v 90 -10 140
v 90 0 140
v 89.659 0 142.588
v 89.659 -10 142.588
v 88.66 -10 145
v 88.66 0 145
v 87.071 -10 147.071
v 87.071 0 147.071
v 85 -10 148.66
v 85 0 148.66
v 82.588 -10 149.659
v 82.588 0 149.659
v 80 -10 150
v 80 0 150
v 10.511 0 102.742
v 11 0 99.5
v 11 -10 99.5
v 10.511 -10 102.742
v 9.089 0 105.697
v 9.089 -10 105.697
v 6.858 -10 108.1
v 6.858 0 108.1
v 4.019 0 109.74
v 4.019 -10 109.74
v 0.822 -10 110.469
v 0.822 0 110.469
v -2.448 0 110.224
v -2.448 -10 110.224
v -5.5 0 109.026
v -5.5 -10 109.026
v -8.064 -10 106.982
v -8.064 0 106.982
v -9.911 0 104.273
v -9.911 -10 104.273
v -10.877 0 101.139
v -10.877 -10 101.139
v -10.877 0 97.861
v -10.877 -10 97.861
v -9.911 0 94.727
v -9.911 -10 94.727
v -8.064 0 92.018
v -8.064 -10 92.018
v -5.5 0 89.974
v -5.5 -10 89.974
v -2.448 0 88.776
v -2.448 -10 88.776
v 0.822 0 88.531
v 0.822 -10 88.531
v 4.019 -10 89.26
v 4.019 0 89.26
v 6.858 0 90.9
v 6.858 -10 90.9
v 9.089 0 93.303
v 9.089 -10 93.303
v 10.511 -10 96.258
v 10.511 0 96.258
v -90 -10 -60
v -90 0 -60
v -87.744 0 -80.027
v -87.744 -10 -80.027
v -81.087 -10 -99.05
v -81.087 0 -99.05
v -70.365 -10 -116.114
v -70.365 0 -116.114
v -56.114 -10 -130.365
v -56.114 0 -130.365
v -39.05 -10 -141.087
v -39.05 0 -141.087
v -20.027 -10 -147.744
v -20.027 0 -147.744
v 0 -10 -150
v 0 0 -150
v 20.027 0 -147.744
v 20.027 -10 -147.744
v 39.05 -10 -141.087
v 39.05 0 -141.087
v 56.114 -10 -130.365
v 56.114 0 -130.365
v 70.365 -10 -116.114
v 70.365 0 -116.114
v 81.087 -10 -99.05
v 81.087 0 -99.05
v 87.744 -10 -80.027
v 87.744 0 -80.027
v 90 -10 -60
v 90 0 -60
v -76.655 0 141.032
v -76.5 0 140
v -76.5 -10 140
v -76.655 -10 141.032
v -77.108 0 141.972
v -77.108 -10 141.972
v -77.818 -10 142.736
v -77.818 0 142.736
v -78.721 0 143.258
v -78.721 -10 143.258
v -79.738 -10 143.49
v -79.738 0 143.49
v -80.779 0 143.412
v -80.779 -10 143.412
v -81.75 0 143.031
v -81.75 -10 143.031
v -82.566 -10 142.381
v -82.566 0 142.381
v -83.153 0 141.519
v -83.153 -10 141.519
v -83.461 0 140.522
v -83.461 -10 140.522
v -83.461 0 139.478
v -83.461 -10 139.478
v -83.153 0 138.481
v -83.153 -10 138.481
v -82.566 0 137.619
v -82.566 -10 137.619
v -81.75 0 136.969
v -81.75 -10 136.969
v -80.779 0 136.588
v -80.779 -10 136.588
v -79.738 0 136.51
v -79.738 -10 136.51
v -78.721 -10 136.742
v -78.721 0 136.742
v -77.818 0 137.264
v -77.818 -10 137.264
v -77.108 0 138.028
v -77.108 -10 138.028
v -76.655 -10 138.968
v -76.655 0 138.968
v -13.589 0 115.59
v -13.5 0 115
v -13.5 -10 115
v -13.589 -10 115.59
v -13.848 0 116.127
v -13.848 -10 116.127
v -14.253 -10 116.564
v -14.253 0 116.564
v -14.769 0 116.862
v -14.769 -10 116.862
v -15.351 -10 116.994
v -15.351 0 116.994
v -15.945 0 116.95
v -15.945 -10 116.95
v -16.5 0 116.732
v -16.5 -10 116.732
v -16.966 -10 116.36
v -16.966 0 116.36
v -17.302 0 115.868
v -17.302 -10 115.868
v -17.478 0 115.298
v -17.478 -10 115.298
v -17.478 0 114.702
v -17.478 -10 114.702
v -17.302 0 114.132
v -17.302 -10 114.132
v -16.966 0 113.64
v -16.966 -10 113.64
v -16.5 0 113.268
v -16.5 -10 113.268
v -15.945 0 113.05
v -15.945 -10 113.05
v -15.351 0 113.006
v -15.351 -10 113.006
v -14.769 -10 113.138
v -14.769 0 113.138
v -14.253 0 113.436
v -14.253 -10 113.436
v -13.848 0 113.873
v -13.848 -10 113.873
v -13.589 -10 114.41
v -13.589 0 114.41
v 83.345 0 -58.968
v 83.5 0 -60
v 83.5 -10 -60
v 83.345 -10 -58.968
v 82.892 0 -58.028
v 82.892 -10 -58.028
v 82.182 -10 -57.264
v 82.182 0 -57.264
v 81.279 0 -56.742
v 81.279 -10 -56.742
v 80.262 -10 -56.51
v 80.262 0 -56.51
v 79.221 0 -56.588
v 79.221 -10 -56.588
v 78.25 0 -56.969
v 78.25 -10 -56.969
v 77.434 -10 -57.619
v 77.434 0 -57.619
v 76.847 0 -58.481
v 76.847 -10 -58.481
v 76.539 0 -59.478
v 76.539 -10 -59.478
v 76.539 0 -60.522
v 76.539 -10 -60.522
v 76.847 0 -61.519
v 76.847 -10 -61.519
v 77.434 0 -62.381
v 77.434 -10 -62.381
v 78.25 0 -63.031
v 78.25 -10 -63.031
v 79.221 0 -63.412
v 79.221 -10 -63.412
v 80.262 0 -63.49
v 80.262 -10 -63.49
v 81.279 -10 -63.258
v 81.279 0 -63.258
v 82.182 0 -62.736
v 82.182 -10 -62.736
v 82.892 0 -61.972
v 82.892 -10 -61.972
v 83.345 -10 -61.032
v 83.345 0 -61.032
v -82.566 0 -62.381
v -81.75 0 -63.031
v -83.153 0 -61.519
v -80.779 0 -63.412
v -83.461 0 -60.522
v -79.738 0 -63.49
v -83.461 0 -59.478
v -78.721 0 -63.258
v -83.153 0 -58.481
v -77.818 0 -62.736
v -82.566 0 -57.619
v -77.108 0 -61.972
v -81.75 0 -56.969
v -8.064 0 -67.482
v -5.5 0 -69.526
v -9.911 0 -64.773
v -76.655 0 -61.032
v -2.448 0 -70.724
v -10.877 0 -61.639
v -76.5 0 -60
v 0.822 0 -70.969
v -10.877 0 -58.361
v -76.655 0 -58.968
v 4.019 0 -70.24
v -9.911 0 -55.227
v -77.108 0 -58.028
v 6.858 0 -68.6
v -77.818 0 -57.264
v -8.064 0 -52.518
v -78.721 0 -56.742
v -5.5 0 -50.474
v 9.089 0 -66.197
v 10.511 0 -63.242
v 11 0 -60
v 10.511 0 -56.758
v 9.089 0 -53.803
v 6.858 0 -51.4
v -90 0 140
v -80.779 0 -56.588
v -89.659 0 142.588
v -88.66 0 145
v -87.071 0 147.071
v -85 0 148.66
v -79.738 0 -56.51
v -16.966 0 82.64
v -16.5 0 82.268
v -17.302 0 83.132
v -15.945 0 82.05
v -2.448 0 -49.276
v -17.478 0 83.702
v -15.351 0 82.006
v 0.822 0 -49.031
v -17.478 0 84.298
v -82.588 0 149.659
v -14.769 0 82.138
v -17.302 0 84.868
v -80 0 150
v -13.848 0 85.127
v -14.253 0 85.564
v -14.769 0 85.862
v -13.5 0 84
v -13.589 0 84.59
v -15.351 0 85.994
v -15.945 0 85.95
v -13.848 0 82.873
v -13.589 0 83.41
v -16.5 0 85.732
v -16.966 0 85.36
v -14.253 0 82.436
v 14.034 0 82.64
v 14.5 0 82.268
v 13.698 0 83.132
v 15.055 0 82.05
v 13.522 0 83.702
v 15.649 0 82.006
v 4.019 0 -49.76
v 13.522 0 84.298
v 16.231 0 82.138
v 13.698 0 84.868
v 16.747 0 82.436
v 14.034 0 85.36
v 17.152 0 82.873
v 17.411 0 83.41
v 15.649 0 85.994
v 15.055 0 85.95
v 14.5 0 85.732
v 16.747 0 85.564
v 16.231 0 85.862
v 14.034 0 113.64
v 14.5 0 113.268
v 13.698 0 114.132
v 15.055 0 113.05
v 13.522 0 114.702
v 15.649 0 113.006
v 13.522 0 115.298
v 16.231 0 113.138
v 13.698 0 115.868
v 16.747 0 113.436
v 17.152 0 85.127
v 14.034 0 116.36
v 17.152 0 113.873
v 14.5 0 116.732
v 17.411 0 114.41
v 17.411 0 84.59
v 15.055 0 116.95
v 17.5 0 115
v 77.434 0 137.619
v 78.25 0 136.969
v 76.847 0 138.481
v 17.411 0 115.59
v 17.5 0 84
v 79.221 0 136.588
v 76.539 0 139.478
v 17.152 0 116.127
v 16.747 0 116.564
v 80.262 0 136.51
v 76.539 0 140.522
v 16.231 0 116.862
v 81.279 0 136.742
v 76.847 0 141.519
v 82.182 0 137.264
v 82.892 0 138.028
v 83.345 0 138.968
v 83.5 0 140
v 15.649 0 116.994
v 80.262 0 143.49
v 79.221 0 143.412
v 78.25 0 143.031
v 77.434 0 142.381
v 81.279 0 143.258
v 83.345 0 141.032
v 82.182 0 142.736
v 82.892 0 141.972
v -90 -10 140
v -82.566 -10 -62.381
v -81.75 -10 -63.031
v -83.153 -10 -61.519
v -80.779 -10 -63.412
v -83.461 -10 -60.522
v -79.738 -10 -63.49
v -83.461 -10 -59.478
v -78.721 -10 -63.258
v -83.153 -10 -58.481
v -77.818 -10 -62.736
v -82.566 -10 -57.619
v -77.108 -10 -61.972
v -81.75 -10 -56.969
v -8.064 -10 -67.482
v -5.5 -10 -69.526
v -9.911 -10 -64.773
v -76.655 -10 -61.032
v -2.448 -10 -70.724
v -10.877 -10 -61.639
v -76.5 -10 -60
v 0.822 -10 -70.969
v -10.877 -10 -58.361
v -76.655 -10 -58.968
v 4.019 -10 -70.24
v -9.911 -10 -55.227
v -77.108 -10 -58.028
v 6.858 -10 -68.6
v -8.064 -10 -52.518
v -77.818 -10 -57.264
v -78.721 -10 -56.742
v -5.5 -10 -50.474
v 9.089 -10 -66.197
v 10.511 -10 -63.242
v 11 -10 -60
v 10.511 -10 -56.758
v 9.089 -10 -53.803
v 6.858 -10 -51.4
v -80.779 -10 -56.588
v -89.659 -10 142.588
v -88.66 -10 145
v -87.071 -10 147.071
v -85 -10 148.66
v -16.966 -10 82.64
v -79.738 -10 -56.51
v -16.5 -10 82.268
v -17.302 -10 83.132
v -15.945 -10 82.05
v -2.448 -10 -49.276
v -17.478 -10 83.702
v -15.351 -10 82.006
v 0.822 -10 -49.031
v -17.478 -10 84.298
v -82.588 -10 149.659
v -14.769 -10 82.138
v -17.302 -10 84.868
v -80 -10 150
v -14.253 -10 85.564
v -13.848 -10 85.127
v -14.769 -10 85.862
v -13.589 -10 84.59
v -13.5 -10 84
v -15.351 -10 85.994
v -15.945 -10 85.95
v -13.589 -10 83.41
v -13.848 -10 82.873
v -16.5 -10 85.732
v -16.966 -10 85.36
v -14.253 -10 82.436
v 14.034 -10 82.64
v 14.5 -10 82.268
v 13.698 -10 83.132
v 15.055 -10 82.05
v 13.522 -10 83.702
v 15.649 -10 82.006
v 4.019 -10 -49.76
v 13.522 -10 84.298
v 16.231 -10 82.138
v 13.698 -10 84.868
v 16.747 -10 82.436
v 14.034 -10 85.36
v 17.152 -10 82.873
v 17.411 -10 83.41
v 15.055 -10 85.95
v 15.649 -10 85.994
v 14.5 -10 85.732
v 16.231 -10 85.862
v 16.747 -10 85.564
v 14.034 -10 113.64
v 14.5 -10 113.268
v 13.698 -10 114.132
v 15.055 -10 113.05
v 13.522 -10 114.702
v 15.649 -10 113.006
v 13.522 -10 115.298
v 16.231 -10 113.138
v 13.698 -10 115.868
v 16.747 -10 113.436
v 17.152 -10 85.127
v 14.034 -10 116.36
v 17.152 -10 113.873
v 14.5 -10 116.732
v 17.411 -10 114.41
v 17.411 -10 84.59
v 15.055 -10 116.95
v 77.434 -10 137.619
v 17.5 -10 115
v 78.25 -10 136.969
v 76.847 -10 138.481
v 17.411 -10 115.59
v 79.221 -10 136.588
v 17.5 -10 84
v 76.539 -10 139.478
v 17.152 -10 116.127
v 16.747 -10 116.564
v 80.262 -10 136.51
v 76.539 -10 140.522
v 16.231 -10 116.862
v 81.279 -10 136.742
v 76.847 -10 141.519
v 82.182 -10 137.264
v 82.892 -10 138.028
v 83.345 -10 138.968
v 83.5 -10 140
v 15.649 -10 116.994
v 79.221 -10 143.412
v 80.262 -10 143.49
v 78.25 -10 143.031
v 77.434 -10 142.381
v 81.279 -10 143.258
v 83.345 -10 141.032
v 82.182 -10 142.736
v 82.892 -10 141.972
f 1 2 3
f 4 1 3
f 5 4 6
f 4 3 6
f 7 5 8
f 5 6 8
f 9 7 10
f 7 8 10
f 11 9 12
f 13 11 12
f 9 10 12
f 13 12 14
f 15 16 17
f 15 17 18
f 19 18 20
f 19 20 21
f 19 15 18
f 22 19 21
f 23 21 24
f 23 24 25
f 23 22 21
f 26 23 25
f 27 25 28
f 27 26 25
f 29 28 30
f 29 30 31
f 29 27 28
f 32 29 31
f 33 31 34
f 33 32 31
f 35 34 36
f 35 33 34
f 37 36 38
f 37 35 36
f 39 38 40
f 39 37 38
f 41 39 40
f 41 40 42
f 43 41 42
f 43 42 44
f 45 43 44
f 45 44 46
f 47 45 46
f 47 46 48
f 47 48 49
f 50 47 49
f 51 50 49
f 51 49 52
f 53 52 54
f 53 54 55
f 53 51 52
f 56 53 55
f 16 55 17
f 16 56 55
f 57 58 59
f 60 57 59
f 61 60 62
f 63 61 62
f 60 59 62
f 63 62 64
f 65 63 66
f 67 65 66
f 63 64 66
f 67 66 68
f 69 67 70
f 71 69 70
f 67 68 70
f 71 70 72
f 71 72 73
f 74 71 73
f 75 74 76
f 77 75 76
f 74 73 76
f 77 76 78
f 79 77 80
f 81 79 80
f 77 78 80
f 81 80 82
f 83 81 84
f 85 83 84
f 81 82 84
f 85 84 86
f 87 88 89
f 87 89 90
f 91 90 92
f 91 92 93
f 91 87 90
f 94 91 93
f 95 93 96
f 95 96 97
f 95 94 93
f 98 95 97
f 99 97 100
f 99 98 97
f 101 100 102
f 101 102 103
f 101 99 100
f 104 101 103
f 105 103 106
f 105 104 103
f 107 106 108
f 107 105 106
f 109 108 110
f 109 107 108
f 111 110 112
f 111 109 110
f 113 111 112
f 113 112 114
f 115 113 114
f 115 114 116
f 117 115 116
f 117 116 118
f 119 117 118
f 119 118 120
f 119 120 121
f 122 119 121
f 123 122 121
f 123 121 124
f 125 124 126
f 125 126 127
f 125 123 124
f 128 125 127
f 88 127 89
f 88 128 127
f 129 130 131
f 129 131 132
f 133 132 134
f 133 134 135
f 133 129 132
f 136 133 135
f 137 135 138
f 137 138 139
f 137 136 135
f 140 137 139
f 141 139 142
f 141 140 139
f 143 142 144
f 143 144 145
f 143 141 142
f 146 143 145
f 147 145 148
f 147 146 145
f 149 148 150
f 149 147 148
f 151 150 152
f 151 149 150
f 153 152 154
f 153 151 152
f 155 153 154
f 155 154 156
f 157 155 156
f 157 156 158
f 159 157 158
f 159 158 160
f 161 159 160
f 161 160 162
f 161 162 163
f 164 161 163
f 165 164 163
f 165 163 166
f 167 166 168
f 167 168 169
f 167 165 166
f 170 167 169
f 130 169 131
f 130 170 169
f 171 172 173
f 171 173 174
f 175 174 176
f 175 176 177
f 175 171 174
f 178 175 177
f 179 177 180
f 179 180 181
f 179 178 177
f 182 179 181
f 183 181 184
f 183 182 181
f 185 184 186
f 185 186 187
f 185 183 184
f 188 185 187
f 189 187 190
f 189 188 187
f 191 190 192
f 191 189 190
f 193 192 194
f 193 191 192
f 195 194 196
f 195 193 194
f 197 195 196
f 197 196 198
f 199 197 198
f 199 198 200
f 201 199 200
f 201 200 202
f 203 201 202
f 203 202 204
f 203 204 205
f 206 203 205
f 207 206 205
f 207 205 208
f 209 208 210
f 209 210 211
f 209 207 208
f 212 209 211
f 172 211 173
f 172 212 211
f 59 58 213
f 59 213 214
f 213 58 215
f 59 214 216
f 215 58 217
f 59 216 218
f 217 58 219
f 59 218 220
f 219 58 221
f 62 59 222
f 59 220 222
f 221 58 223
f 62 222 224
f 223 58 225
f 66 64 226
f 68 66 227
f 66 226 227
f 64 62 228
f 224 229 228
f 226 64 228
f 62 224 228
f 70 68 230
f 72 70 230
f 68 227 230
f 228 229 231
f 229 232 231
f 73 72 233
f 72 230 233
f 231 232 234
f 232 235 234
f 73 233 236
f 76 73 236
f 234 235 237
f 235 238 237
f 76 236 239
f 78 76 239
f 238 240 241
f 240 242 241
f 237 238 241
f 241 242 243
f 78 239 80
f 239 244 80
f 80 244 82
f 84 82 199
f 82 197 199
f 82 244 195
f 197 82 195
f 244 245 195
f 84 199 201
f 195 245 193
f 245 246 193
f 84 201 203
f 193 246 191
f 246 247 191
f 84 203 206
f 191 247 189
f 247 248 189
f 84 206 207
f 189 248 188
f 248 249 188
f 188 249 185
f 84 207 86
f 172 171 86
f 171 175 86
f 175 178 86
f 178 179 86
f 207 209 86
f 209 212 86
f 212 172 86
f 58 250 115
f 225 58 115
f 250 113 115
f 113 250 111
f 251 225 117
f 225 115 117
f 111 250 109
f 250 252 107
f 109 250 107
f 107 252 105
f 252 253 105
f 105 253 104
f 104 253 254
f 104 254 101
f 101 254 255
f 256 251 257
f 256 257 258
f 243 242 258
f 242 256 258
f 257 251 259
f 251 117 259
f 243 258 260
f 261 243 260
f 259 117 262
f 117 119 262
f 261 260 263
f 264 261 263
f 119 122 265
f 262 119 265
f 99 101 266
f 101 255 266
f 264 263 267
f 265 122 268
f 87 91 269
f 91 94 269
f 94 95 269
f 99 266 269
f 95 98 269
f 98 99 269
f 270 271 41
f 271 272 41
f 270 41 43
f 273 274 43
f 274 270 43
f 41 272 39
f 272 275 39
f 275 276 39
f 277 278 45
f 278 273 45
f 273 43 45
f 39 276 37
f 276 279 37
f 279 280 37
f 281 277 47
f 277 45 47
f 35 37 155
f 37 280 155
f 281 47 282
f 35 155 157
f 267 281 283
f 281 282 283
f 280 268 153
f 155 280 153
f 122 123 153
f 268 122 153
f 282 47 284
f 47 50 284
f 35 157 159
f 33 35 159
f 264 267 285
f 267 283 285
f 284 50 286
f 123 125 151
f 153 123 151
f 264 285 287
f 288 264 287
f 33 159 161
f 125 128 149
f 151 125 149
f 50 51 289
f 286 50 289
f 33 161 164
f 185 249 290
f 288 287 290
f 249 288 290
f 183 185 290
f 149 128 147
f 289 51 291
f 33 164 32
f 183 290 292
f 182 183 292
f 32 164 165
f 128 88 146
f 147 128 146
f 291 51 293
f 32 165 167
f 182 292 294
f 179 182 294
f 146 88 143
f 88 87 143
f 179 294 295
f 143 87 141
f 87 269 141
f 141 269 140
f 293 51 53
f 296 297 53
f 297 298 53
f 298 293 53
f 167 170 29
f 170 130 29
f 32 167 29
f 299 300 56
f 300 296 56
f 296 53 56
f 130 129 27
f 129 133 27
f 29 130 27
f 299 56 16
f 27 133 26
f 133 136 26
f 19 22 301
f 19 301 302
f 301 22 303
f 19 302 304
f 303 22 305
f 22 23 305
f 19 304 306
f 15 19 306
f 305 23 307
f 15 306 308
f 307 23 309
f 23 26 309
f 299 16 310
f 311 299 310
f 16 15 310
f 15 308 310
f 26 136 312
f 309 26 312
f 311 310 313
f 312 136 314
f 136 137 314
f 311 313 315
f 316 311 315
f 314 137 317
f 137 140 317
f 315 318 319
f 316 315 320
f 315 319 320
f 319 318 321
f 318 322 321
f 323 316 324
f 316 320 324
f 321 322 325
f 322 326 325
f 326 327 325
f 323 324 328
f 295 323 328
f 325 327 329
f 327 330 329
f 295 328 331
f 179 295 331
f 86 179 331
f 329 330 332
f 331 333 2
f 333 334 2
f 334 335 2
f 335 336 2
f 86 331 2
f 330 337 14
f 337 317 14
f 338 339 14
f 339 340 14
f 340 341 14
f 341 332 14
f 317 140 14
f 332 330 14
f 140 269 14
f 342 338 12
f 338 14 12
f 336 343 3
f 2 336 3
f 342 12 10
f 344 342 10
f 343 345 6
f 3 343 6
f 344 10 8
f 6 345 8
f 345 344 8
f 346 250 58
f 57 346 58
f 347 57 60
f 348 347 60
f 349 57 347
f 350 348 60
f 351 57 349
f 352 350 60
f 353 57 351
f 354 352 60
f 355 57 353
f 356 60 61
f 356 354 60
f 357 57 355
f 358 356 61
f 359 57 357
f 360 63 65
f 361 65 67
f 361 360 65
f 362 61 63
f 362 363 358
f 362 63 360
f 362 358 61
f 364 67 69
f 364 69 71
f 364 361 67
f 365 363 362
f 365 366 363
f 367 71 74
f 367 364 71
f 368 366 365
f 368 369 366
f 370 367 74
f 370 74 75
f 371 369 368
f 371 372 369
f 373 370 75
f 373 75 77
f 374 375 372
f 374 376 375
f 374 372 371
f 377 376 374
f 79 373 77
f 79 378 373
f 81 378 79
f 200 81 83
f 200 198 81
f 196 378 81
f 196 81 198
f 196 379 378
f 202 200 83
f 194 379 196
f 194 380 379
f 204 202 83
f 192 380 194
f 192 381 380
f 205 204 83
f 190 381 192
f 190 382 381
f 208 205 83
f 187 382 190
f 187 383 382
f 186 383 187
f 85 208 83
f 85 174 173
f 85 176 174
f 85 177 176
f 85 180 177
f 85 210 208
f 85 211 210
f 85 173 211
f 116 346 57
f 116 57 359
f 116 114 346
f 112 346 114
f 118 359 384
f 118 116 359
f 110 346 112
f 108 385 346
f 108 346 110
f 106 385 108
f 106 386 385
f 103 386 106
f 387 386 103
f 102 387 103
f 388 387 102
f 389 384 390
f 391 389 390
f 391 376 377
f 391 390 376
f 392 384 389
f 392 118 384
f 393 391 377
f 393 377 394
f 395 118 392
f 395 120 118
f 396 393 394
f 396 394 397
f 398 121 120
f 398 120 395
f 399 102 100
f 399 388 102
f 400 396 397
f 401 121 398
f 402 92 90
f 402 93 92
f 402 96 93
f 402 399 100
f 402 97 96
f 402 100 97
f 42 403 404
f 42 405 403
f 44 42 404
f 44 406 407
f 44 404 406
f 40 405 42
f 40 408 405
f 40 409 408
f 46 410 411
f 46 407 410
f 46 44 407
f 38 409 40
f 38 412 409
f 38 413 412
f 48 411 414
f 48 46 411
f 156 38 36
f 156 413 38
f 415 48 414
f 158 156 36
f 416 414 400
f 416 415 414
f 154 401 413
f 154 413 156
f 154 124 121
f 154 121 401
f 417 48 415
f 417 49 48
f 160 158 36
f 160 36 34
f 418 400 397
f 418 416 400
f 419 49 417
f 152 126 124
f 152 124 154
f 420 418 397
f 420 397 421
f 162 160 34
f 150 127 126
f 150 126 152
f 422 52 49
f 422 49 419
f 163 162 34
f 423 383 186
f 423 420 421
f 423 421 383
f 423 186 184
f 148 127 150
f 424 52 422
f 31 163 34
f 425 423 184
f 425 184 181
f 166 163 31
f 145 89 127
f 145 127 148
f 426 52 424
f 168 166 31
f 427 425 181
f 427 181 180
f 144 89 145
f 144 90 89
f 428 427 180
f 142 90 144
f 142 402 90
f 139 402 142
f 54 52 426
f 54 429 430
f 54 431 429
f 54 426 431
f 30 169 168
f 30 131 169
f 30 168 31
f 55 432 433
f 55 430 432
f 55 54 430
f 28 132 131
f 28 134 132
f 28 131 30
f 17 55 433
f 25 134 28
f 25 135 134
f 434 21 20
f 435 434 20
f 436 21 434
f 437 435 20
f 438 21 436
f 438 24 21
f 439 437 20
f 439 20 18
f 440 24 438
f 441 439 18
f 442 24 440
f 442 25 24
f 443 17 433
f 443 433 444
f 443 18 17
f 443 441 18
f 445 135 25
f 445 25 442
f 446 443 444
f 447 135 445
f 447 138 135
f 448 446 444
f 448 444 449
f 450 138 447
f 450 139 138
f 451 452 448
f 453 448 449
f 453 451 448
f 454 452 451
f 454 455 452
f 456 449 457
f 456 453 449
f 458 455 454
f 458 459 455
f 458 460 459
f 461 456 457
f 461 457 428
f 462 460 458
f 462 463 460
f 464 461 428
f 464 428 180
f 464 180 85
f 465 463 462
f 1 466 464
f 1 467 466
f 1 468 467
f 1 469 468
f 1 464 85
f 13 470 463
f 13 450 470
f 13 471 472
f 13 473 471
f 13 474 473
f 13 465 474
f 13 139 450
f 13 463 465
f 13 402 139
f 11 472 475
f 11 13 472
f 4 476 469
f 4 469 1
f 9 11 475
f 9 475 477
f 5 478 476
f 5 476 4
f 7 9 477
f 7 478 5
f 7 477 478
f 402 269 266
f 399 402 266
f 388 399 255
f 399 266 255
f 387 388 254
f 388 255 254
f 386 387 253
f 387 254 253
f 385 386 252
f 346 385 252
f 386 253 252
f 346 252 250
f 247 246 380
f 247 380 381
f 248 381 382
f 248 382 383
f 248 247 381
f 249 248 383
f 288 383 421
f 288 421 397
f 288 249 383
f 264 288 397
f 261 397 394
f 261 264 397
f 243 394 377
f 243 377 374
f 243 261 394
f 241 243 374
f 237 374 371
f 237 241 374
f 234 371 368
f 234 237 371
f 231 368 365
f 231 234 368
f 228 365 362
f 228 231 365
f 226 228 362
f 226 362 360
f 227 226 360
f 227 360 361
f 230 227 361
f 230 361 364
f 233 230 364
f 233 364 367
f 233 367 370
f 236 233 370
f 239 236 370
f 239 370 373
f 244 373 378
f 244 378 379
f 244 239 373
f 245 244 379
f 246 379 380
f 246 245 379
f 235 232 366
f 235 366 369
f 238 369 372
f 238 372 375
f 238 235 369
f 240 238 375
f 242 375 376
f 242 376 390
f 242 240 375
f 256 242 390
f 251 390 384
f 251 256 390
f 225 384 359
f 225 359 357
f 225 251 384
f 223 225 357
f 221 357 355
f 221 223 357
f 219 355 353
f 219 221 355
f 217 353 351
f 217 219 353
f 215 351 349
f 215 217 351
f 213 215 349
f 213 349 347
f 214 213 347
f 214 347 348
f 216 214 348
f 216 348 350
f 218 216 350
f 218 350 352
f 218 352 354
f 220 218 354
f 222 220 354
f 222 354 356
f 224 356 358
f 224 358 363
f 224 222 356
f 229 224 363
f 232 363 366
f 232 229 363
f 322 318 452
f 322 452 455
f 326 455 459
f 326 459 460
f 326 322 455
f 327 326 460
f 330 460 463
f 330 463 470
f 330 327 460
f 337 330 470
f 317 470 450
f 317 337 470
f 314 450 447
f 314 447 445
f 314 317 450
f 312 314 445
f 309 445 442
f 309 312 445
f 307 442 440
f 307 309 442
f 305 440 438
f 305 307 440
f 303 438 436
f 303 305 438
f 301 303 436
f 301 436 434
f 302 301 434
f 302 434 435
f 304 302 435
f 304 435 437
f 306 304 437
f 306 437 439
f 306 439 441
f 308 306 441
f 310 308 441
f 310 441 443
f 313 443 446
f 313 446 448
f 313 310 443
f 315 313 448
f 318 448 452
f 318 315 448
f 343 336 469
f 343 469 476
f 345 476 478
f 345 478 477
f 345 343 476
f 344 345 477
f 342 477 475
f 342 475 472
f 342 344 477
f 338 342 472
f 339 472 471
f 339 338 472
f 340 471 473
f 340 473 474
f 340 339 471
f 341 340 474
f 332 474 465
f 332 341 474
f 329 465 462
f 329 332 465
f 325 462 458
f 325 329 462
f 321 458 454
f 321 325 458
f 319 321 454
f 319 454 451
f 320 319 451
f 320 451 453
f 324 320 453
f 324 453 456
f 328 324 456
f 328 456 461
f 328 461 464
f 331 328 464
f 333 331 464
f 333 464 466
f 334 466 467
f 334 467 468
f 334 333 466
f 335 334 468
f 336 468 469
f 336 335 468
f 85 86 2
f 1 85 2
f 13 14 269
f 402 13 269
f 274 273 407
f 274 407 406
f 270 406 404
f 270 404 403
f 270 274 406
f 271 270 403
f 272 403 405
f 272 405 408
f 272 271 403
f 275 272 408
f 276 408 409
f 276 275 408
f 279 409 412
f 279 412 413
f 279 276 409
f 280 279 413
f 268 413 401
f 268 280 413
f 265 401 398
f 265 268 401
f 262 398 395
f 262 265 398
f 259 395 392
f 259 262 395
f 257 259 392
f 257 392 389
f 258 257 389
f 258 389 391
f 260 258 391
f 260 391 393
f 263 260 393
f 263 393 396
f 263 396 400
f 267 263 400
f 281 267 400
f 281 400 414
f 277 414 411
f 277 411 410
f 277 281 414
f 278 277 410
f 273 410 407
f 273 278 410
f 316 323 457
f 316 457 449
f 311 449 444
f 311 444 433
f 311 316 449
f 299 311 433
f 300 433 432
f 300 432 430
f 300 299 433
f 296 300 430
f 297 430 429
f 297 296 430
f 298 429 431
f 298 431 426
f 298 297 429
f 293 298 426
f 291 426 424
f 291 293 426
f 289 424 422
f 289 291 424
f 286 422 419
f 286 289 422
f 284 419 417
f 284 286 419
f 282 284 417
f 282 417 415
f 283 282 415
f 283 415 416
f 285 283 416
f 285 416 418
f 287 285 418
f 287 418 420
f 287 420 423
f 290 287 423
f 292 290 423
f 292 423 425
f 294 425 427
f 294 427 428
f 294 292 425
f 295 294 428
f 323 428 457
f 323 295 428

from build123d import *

# Parameters (mm, degrees)
F0_R     = 3.5
F0_R_2   = 11
F0_R_3   = 2
F1_DEPTH = 10


with BuildPart() as f1:
    # F0 (on Front) → F1 (new body)
    with BuildSketch(Plane.XZ):
        with BuildLine():
            ThreePointArc((90, 140), (87.071068, 147.071068), (80, 150))
            Line((80, 150), (-80, 150))
            ThreePointArc((-80, 150), (-87.071068, 147.071068), (-90, 140))
            Line((-90, 140), (-90, -60))
            ThreePointArc((-90, -60), (-63.63961, -123.63961), (0, -150))
            ThreePointArc((0, -150), (63.63961, -123.63961), (90, -60))
            Line((90, -60), (90, 140))
        make_face()
        with Locations((-80, -60)):
            Circle(F0_R, mode=Mode.SUBTRACT)
        with Locations((0, -60)):
            Circle(F0_R_2, mode=Mode.SUBTRACT)
        with Locations((80, -60)):
            Circle(F0_R, mode=Mode.SUBTRACT)
        with Locations((-80, 140)):
            Circle(F0_R, mode=Mode.SUBTRACT)
        with Locations((-15.5, 84)):
            Circle(F0_R_3, mode=Mode.SUBTRACT)
        with Locations((-15.5, 115)):
            Circle(F0_R_3, mode=Mode.SUBTRACT)
        with Locations((15.5, 84)):
            Circle(F0_R_3, mode=Mode.SUBTRACT)
        with Locations((0, 99.5)):
            Circle(F0_R_2, mode=Mode.SUBTRACT)
        with Locations((15.5, 115)):
            Circle(F0_R_3, mode=Mode.SUBTRACT)
        with Locations((80, 140)):
            Circle(F0_R, mode=Mode.SUBTRACT)
    extrude(amount=F1_DEPTH)


solid = f1.part
